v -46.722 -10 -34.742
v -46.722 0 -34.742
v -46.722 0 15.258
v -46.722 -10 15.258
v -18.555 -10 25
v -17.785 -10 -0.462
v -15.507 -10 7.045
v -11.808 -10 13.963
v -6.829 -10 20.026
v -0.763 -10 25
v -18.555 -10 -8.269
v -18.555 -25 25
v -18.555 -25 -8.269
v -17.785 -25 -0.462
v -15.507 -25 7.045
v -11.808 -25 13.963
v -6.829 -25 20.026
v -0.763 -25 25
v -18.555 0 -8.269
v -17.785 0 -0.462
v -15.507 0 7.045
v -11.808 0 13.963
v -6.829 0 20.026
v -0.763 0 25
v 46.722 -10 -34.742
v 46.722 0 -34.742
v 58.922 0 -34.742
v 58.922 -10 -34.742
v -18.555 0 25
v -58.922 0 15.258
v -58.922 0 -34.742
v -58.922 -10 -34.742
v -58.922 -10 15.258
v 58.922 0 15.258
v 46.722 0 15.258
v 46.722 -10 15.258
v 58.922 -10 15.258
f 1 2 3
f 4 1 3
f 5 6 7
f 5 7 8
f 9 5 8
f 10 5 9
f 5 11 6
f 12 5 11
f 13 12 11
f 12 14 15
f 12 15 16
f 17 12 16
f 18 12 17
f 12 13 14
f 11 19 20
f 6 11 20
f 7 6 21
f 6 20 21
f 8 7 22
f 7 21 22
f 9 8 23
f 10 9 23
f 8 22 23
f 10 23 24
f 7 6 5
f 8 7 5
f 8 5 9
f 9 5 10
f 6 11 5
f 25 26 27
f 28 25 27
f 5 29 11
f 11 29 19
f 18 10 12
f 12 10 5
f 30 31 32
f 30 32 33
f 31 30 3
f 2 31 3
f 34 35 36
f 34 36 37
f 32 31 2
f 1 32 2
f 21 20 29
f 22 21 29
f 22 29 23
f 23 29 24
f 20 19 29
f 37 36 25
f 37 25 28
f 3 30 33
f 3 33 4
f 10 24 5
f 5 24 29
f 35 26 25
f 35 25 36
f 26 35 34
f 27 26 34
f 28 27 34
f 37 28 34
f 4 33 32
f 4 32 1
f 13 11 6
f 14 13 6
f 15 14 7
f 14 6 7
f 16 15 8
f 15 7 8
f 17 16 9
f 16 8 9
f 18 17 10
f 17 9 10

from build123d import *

# Parameters (mm, degrees)
F1_DEPTH = 10
F0_W     = 12.2
F0_H     = 50
F2_DEPTH = 15


with BuildPart() as f1:
    # F0 (on Front) → F1 (new body)
    with BuildSketch(Plane.XZ):
        with BuildLine():
            ThreePointArc((-18.5547723852, -8.2686455011), (-13.8274372079, 10.5950528717), (-0.7628165701, 25))
            Line((-0.7628165701, 25), (-18.5547723852, 25))
            Line((-18.5547723852, 25), (-18.5547723852, -8.2686455011))
        make_face()
    extrude(amount=F1_DEPTH)


with BuildPart() as f1b:
    # F0 (on Front) → F1, piece 2 (new body)
    with BuildSketch(Plane.XZ):
        with Locations((52.8224339074, -9.7424781105)):
            Rectangle(F0_W, F0_H)
    extrude(amount=F1_DEPTH)


with BuildPart() as f1c:
    # F0 (on Front) → F1, piece 3 (new body)
    with BuildSketch(Plane.XZ):
        with Locations((-52.8224339074, -9.7424781105)):
            Rectangle(F0_W, F0_H)
    extrude(amount=F1_DEPTH)


with BuildPart() as f2:
    # F2 (new): a face of the model
    f2_faces = [f1.part.faces().sort_by_distance(p)[0] for p in [
        (-13.5079798624, -10, 17.0974885768),
    ]]
    extrude(f2_faces, amount=F2_DEPTH)


solid = Compound([f1.part, f1b.part, f1c.part, f2.part])
